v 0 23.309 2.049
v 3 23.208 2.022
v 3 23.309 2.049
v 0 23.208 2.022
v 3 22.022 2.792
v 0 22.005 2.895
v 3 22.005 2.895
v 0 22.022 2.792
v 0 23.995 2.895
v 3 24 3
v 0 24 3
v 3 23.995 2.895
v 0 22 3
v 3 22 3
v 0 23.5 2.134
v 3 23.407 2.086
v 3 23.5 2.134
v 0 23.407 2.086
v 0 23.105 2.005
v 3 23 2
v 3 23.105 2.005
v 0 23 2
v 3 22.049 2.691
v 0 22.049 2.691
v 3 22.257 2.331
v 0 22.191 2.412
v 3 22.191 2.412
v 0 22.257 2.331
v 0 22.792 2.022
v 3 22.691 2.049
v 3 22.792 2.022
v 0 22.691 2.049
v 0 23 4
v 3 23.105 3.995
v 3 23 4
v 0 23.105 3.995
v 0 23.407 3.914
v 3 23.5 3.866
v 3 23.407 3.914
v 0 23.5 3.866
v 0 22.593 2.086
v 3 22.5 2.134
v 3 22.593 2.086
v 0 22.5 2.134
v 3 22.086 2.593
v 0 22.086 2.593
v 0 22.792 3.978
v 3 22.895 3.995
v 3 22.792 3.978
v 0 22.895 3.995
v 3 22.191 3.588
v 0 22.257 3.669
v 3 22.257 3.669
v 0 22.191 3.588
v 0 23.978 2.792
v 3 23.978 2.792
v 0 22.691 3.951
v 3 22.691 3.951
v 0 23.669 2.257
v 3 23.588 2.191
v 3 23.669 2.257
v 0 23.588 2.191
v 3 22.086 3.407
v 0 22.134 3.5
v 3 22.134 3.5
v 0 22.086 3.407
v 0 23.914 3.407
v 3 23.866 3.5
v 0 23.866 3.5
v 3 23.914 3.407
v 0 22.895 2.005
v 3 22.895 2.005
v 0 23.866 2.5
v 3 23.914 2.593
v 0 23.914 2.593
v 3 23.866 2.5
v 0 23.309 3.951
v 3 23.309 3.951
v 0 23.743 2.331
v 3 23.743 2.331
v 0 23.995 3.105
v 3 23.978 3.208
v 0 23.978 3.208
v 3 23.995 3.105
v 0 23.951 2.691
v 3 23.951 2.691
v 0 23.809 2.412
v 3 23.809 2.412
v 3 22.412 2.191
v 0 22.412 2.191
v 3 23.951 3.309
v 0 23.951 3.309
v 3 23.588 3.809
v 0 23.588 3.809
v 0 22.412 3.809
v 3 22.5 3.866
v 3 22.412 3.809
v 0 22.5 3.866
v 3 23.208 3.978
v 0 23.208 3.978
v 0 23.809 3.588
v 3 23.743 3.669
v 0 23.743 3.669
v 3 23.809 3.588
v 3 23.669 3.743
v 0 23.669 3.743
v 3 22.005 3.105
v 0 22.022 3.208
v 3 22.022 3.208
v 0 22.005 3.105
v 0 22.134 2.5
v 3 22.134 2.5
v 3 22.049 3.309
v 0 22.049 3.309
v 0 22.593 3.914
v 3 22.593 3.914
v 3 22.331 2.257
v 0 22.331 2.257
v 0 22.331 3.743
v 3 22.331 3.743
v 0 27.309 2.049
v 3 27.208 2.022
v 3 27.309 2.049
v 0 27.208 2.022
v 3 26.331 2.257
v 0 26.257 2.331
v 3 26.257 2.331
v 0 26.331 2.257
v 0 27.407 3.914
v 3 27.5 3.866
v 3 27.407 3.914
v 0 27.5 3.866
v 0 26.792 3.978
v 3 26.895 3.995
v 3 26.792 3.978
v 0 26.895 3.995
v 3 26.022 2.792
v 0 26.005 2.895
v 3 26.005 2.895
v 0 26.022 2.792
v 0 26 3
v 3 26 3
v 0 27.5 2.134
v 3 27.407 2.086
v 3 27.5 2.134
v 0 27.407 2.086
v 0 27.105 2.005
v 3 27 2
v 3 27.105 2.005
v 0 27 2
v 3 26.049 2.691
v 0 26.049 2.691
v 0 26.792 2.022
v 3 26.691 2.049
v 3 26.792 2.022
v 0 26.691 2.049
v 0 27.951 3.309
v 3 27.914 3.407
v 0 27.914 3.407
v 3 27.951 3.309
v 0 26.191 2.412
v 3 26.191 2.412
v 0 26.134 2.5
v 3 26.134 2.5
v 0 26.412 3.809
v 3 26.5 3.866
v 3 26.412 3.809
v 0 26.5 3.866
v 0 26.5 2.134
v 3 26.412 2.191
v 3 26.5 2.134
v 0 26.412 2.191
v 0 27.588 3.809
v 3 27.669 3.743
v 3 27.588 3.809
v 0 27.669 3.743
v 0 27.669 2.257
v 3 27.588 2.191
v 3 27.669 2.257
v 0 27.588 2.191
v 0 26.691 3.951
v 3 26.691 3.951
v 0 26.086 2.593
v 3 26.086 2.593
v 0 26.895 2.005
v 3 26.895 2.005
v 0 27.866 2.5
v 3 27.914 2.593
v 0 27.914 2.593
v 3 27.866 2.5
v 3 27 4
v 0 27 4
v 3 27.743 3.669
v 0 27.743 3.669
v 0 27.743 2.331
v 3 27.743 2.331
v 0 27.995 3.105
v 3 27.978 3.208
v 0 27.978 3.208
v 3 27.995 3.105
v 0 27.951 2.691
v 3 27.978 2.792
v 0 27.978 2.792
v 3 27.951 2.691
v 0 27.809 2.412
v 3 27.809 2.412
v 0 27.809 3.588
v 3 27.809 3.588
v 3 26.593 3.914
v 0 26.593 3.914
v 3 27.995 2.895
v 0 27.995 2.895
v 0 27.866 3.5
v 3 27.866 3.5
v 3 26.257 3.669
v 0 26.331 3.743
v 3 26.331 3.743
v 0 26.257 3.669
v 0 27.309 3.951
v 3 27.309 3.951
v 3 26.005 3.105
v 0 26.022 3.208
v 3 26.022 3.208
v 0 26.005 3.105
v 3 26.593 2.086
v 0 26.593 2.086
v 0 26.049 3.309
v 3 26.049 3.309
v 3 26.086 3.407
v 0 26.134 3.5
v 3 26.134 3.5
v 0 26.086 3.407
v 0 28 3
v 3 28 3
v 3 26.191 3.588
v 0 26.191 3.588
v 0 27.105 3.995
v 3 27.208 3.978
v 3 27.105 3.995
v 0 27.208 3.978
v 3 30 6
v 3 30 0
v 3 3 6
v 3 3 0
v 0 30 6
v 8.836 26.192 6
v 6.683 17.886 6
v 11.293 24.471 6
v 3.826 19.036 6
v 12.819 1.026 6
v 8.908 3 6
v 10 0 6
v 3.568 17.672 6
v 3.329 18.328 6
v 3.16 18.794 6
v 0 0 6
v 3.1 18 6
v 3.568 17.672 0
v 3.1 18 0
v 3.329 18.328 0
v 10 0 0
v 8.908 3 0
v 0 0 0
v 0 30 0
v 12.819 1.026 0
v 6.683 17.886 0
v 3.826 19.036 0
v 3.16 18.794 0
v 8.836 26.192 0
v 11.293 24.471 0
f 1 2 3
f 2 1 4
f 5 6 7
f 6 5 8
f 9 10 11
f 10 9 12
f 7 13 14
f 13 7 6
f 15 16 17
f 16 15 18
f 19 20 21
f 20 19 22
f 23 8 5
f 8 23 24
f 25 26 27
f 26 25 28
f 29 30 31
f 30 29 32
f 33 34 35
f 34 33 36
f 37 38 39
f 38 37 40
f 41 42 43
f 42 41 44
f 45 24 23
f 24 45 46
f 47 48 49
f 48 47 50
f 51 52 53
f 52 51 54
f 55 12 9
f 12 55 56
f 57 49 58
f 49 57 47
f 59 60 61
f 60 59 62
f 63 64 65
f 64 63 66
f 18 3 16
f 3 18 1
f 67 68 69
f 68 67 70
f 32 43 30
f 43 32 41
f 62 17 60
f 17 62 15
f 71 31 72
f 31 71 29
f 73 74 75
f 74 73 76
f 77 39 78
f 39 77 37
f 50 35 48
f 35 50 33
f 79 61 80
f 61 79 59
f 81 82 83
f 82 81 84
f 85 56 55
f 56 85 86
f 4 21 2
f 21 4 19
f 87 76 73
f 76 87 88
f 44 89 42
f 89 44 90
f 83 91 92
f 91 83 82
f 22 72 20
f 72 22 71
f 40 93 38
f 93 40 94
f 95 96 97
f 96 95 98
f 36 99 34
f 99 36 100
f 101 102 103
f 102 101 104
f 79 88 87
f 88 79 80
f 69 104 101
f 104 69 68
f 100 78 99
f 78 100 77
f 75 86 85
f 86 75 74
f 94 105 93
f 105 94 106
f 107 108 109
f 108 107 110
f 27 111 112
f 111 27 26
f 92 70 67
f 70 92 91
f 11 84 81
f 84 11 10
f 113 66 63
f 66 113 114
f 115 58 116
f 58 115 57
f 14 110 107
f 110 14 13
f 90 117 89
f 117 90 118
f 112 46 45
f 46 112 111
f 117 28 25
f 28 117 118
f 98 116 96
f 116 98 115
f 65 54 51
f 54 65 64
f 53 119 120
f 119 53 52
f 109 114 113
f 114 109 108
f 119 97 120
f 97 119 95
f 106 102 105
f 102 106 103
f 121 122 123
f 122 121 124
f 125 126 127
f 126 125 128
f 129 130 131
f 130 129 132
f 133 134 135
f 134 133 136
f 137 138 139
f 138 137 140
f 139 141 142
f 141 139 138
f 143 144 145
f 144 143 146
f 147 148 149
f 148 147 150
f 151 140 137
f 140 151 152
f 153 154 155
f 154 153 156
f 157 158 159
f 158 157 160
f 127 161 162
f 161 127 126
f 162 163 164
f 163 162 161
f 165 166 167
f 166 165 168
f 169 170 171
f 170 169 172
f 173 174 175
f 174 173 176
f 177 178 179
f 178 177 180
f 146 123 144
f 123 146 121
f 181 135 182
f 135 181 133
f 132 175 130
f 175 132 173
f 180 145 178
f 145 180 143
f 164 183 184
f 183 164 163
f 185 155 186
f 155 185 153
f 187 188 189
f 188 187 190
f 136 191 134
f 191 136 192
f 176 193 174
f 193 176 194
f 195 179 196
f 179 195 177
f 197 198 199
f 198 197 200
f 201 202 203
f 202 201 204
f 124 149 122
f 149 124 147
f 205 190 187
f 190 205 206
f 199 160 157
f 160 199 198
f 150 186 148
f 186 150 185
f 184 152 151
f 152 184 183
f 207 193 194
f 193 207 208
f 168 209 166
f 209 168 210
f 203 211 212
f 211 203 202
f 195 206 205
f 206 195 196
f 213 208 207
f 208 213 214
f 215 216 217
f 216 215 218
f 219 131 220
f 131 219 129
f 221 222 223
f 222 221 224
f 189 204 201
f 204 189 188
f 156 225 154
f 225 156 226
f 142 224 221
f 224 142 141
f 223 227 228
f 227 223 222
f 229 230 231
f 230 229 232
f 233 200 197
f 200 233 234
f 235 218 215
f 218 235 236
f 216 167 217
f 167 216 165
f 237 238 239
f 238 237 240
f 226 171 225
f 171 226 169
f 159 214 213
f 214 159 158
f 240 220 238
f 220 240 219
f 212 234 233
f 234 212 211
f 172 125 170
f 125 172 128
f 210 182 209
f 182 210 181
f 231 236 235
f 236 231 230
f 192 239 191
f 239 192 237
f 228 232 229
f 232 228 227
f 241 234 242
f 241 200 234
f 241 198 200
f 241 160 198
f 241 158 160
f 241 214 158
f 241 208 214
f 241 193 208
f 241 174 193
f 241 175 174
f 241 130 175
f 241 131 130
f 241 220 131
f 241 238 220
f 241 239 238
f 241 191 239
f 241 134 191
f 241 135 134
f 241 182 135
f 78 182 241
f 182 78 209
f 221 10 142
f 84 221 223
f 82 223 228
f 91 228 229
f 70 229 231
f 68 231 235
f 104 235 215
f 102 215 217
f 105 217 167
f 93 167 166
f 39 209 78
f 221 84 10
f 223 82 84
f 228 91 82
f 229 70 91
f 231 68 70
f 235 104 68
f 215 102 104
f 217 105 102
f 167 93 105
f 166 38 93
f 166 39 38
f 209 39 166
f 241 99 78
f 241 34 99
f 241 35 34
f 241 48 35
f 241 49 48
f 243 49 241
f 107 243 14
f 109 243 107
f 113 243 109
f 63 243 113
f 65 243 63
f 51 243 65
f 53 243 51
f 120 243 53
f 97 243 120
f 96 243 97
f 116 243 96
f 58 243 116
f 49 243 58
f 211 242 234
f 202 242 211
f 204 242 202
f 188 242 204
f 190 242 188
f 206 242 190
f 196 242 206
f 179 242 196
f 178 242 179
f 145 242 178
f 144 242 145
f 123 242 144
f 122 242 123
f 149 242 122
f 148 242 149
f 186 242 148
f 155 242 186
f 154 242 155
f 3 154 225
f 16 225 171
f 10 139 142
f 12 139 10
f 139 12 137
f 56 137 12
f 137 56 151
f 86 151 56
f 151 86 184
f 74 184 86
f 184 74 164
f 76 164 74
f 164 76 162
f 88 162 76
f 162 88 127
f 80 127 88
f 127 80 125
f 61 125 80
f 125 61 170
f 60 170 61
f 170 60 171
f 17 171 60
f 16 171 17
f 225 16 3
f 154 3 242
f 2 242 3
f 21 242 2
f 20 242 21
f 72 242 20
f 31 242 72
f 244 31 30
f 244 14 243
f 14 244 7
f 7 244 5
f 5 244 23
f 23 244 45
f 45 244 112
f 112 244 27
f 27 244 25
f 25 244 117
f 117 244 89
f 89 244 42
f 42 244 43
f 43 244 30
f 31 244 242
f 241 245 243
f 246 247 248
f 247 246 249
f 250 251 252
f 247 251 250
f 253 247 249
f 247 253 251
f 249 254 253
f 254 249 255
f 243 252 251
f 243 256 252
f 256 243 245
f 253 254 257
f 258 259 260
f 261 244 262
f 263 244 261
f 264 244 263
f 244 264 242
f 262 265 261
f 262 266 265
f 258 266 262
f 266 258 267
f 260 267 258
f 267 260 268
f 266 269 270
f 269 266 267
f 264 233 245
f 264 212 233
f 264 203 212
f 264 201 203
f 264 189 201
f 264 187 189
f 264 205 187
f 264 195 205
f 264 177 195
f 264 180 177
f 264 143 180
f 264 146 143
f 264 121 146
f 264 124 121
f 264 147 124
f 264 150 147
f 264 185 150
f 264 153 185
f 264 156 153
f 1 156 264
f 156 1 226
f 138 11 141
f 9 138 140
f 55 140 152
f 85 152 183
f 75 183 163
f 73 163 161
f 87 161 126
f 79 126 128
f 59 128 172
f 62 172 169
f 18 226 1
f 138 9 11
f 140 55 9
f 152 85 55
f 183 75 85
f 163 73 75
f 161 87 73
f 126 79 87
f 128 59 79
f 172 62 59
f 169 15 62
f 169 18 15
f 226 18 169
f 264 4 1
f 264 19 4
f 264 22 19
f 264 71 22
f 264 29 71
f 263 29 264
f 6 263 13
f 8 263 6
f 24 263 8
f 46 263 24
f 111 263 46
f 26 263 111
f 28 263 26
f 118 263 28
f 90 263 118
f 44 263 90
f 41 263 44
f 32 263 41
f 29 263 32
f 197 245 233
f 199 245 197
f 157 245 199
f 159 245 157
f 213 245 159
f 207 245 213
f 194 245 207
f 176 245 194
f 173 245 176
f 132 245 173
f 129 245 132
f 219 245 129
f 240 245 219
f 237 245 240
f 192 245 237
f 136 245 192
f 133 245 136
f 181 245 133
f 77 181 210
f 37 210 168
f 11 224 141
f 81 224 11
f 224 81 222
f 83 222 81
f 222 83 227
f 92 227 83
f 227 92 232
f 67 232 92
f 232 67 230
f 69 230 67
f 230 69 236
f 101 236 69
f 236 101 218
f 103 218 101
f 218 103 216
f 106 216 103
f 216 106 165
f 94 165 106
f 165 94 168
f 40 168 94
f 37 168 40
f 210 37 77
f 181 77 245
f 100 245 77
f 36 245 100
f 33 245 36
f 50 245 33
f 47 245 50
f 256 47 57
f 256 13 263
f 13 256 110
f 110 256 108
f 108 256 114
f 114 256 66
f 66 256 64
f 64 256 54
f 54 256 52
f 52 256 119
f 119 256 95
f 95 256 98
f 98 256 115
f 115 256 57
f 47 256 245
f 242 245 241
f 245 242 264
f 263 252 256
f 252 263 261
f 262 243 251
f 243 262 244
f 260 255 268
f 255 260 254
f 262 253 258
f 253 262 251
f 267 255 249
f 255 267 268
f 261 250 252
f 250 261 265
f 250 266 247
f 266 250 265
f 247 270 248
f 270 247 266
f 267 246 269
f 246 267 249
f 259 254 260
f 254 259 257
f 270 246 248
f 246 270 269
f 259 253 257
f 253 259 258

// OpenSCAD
difference(){
	cube([3,30,6]);
	union(){
			translate([-5,23,3])
				rotate([0,90,0])
			#		cylinder(r=1, h=10, $fn=60);
			translate([-5,27,3])
				rotate([0,90,0])
			#		cylinder(r=1, h=10, $fn=60);
	}
}


translate([0,0,0])
	cube([10,3,6]);

translate([10,0,0])
	rotate([0,0,20])
		cube([3,20,6]);

#translate([3.1,18,0])
	rotate([0,0,-35])
		cube([3,10,6]);
